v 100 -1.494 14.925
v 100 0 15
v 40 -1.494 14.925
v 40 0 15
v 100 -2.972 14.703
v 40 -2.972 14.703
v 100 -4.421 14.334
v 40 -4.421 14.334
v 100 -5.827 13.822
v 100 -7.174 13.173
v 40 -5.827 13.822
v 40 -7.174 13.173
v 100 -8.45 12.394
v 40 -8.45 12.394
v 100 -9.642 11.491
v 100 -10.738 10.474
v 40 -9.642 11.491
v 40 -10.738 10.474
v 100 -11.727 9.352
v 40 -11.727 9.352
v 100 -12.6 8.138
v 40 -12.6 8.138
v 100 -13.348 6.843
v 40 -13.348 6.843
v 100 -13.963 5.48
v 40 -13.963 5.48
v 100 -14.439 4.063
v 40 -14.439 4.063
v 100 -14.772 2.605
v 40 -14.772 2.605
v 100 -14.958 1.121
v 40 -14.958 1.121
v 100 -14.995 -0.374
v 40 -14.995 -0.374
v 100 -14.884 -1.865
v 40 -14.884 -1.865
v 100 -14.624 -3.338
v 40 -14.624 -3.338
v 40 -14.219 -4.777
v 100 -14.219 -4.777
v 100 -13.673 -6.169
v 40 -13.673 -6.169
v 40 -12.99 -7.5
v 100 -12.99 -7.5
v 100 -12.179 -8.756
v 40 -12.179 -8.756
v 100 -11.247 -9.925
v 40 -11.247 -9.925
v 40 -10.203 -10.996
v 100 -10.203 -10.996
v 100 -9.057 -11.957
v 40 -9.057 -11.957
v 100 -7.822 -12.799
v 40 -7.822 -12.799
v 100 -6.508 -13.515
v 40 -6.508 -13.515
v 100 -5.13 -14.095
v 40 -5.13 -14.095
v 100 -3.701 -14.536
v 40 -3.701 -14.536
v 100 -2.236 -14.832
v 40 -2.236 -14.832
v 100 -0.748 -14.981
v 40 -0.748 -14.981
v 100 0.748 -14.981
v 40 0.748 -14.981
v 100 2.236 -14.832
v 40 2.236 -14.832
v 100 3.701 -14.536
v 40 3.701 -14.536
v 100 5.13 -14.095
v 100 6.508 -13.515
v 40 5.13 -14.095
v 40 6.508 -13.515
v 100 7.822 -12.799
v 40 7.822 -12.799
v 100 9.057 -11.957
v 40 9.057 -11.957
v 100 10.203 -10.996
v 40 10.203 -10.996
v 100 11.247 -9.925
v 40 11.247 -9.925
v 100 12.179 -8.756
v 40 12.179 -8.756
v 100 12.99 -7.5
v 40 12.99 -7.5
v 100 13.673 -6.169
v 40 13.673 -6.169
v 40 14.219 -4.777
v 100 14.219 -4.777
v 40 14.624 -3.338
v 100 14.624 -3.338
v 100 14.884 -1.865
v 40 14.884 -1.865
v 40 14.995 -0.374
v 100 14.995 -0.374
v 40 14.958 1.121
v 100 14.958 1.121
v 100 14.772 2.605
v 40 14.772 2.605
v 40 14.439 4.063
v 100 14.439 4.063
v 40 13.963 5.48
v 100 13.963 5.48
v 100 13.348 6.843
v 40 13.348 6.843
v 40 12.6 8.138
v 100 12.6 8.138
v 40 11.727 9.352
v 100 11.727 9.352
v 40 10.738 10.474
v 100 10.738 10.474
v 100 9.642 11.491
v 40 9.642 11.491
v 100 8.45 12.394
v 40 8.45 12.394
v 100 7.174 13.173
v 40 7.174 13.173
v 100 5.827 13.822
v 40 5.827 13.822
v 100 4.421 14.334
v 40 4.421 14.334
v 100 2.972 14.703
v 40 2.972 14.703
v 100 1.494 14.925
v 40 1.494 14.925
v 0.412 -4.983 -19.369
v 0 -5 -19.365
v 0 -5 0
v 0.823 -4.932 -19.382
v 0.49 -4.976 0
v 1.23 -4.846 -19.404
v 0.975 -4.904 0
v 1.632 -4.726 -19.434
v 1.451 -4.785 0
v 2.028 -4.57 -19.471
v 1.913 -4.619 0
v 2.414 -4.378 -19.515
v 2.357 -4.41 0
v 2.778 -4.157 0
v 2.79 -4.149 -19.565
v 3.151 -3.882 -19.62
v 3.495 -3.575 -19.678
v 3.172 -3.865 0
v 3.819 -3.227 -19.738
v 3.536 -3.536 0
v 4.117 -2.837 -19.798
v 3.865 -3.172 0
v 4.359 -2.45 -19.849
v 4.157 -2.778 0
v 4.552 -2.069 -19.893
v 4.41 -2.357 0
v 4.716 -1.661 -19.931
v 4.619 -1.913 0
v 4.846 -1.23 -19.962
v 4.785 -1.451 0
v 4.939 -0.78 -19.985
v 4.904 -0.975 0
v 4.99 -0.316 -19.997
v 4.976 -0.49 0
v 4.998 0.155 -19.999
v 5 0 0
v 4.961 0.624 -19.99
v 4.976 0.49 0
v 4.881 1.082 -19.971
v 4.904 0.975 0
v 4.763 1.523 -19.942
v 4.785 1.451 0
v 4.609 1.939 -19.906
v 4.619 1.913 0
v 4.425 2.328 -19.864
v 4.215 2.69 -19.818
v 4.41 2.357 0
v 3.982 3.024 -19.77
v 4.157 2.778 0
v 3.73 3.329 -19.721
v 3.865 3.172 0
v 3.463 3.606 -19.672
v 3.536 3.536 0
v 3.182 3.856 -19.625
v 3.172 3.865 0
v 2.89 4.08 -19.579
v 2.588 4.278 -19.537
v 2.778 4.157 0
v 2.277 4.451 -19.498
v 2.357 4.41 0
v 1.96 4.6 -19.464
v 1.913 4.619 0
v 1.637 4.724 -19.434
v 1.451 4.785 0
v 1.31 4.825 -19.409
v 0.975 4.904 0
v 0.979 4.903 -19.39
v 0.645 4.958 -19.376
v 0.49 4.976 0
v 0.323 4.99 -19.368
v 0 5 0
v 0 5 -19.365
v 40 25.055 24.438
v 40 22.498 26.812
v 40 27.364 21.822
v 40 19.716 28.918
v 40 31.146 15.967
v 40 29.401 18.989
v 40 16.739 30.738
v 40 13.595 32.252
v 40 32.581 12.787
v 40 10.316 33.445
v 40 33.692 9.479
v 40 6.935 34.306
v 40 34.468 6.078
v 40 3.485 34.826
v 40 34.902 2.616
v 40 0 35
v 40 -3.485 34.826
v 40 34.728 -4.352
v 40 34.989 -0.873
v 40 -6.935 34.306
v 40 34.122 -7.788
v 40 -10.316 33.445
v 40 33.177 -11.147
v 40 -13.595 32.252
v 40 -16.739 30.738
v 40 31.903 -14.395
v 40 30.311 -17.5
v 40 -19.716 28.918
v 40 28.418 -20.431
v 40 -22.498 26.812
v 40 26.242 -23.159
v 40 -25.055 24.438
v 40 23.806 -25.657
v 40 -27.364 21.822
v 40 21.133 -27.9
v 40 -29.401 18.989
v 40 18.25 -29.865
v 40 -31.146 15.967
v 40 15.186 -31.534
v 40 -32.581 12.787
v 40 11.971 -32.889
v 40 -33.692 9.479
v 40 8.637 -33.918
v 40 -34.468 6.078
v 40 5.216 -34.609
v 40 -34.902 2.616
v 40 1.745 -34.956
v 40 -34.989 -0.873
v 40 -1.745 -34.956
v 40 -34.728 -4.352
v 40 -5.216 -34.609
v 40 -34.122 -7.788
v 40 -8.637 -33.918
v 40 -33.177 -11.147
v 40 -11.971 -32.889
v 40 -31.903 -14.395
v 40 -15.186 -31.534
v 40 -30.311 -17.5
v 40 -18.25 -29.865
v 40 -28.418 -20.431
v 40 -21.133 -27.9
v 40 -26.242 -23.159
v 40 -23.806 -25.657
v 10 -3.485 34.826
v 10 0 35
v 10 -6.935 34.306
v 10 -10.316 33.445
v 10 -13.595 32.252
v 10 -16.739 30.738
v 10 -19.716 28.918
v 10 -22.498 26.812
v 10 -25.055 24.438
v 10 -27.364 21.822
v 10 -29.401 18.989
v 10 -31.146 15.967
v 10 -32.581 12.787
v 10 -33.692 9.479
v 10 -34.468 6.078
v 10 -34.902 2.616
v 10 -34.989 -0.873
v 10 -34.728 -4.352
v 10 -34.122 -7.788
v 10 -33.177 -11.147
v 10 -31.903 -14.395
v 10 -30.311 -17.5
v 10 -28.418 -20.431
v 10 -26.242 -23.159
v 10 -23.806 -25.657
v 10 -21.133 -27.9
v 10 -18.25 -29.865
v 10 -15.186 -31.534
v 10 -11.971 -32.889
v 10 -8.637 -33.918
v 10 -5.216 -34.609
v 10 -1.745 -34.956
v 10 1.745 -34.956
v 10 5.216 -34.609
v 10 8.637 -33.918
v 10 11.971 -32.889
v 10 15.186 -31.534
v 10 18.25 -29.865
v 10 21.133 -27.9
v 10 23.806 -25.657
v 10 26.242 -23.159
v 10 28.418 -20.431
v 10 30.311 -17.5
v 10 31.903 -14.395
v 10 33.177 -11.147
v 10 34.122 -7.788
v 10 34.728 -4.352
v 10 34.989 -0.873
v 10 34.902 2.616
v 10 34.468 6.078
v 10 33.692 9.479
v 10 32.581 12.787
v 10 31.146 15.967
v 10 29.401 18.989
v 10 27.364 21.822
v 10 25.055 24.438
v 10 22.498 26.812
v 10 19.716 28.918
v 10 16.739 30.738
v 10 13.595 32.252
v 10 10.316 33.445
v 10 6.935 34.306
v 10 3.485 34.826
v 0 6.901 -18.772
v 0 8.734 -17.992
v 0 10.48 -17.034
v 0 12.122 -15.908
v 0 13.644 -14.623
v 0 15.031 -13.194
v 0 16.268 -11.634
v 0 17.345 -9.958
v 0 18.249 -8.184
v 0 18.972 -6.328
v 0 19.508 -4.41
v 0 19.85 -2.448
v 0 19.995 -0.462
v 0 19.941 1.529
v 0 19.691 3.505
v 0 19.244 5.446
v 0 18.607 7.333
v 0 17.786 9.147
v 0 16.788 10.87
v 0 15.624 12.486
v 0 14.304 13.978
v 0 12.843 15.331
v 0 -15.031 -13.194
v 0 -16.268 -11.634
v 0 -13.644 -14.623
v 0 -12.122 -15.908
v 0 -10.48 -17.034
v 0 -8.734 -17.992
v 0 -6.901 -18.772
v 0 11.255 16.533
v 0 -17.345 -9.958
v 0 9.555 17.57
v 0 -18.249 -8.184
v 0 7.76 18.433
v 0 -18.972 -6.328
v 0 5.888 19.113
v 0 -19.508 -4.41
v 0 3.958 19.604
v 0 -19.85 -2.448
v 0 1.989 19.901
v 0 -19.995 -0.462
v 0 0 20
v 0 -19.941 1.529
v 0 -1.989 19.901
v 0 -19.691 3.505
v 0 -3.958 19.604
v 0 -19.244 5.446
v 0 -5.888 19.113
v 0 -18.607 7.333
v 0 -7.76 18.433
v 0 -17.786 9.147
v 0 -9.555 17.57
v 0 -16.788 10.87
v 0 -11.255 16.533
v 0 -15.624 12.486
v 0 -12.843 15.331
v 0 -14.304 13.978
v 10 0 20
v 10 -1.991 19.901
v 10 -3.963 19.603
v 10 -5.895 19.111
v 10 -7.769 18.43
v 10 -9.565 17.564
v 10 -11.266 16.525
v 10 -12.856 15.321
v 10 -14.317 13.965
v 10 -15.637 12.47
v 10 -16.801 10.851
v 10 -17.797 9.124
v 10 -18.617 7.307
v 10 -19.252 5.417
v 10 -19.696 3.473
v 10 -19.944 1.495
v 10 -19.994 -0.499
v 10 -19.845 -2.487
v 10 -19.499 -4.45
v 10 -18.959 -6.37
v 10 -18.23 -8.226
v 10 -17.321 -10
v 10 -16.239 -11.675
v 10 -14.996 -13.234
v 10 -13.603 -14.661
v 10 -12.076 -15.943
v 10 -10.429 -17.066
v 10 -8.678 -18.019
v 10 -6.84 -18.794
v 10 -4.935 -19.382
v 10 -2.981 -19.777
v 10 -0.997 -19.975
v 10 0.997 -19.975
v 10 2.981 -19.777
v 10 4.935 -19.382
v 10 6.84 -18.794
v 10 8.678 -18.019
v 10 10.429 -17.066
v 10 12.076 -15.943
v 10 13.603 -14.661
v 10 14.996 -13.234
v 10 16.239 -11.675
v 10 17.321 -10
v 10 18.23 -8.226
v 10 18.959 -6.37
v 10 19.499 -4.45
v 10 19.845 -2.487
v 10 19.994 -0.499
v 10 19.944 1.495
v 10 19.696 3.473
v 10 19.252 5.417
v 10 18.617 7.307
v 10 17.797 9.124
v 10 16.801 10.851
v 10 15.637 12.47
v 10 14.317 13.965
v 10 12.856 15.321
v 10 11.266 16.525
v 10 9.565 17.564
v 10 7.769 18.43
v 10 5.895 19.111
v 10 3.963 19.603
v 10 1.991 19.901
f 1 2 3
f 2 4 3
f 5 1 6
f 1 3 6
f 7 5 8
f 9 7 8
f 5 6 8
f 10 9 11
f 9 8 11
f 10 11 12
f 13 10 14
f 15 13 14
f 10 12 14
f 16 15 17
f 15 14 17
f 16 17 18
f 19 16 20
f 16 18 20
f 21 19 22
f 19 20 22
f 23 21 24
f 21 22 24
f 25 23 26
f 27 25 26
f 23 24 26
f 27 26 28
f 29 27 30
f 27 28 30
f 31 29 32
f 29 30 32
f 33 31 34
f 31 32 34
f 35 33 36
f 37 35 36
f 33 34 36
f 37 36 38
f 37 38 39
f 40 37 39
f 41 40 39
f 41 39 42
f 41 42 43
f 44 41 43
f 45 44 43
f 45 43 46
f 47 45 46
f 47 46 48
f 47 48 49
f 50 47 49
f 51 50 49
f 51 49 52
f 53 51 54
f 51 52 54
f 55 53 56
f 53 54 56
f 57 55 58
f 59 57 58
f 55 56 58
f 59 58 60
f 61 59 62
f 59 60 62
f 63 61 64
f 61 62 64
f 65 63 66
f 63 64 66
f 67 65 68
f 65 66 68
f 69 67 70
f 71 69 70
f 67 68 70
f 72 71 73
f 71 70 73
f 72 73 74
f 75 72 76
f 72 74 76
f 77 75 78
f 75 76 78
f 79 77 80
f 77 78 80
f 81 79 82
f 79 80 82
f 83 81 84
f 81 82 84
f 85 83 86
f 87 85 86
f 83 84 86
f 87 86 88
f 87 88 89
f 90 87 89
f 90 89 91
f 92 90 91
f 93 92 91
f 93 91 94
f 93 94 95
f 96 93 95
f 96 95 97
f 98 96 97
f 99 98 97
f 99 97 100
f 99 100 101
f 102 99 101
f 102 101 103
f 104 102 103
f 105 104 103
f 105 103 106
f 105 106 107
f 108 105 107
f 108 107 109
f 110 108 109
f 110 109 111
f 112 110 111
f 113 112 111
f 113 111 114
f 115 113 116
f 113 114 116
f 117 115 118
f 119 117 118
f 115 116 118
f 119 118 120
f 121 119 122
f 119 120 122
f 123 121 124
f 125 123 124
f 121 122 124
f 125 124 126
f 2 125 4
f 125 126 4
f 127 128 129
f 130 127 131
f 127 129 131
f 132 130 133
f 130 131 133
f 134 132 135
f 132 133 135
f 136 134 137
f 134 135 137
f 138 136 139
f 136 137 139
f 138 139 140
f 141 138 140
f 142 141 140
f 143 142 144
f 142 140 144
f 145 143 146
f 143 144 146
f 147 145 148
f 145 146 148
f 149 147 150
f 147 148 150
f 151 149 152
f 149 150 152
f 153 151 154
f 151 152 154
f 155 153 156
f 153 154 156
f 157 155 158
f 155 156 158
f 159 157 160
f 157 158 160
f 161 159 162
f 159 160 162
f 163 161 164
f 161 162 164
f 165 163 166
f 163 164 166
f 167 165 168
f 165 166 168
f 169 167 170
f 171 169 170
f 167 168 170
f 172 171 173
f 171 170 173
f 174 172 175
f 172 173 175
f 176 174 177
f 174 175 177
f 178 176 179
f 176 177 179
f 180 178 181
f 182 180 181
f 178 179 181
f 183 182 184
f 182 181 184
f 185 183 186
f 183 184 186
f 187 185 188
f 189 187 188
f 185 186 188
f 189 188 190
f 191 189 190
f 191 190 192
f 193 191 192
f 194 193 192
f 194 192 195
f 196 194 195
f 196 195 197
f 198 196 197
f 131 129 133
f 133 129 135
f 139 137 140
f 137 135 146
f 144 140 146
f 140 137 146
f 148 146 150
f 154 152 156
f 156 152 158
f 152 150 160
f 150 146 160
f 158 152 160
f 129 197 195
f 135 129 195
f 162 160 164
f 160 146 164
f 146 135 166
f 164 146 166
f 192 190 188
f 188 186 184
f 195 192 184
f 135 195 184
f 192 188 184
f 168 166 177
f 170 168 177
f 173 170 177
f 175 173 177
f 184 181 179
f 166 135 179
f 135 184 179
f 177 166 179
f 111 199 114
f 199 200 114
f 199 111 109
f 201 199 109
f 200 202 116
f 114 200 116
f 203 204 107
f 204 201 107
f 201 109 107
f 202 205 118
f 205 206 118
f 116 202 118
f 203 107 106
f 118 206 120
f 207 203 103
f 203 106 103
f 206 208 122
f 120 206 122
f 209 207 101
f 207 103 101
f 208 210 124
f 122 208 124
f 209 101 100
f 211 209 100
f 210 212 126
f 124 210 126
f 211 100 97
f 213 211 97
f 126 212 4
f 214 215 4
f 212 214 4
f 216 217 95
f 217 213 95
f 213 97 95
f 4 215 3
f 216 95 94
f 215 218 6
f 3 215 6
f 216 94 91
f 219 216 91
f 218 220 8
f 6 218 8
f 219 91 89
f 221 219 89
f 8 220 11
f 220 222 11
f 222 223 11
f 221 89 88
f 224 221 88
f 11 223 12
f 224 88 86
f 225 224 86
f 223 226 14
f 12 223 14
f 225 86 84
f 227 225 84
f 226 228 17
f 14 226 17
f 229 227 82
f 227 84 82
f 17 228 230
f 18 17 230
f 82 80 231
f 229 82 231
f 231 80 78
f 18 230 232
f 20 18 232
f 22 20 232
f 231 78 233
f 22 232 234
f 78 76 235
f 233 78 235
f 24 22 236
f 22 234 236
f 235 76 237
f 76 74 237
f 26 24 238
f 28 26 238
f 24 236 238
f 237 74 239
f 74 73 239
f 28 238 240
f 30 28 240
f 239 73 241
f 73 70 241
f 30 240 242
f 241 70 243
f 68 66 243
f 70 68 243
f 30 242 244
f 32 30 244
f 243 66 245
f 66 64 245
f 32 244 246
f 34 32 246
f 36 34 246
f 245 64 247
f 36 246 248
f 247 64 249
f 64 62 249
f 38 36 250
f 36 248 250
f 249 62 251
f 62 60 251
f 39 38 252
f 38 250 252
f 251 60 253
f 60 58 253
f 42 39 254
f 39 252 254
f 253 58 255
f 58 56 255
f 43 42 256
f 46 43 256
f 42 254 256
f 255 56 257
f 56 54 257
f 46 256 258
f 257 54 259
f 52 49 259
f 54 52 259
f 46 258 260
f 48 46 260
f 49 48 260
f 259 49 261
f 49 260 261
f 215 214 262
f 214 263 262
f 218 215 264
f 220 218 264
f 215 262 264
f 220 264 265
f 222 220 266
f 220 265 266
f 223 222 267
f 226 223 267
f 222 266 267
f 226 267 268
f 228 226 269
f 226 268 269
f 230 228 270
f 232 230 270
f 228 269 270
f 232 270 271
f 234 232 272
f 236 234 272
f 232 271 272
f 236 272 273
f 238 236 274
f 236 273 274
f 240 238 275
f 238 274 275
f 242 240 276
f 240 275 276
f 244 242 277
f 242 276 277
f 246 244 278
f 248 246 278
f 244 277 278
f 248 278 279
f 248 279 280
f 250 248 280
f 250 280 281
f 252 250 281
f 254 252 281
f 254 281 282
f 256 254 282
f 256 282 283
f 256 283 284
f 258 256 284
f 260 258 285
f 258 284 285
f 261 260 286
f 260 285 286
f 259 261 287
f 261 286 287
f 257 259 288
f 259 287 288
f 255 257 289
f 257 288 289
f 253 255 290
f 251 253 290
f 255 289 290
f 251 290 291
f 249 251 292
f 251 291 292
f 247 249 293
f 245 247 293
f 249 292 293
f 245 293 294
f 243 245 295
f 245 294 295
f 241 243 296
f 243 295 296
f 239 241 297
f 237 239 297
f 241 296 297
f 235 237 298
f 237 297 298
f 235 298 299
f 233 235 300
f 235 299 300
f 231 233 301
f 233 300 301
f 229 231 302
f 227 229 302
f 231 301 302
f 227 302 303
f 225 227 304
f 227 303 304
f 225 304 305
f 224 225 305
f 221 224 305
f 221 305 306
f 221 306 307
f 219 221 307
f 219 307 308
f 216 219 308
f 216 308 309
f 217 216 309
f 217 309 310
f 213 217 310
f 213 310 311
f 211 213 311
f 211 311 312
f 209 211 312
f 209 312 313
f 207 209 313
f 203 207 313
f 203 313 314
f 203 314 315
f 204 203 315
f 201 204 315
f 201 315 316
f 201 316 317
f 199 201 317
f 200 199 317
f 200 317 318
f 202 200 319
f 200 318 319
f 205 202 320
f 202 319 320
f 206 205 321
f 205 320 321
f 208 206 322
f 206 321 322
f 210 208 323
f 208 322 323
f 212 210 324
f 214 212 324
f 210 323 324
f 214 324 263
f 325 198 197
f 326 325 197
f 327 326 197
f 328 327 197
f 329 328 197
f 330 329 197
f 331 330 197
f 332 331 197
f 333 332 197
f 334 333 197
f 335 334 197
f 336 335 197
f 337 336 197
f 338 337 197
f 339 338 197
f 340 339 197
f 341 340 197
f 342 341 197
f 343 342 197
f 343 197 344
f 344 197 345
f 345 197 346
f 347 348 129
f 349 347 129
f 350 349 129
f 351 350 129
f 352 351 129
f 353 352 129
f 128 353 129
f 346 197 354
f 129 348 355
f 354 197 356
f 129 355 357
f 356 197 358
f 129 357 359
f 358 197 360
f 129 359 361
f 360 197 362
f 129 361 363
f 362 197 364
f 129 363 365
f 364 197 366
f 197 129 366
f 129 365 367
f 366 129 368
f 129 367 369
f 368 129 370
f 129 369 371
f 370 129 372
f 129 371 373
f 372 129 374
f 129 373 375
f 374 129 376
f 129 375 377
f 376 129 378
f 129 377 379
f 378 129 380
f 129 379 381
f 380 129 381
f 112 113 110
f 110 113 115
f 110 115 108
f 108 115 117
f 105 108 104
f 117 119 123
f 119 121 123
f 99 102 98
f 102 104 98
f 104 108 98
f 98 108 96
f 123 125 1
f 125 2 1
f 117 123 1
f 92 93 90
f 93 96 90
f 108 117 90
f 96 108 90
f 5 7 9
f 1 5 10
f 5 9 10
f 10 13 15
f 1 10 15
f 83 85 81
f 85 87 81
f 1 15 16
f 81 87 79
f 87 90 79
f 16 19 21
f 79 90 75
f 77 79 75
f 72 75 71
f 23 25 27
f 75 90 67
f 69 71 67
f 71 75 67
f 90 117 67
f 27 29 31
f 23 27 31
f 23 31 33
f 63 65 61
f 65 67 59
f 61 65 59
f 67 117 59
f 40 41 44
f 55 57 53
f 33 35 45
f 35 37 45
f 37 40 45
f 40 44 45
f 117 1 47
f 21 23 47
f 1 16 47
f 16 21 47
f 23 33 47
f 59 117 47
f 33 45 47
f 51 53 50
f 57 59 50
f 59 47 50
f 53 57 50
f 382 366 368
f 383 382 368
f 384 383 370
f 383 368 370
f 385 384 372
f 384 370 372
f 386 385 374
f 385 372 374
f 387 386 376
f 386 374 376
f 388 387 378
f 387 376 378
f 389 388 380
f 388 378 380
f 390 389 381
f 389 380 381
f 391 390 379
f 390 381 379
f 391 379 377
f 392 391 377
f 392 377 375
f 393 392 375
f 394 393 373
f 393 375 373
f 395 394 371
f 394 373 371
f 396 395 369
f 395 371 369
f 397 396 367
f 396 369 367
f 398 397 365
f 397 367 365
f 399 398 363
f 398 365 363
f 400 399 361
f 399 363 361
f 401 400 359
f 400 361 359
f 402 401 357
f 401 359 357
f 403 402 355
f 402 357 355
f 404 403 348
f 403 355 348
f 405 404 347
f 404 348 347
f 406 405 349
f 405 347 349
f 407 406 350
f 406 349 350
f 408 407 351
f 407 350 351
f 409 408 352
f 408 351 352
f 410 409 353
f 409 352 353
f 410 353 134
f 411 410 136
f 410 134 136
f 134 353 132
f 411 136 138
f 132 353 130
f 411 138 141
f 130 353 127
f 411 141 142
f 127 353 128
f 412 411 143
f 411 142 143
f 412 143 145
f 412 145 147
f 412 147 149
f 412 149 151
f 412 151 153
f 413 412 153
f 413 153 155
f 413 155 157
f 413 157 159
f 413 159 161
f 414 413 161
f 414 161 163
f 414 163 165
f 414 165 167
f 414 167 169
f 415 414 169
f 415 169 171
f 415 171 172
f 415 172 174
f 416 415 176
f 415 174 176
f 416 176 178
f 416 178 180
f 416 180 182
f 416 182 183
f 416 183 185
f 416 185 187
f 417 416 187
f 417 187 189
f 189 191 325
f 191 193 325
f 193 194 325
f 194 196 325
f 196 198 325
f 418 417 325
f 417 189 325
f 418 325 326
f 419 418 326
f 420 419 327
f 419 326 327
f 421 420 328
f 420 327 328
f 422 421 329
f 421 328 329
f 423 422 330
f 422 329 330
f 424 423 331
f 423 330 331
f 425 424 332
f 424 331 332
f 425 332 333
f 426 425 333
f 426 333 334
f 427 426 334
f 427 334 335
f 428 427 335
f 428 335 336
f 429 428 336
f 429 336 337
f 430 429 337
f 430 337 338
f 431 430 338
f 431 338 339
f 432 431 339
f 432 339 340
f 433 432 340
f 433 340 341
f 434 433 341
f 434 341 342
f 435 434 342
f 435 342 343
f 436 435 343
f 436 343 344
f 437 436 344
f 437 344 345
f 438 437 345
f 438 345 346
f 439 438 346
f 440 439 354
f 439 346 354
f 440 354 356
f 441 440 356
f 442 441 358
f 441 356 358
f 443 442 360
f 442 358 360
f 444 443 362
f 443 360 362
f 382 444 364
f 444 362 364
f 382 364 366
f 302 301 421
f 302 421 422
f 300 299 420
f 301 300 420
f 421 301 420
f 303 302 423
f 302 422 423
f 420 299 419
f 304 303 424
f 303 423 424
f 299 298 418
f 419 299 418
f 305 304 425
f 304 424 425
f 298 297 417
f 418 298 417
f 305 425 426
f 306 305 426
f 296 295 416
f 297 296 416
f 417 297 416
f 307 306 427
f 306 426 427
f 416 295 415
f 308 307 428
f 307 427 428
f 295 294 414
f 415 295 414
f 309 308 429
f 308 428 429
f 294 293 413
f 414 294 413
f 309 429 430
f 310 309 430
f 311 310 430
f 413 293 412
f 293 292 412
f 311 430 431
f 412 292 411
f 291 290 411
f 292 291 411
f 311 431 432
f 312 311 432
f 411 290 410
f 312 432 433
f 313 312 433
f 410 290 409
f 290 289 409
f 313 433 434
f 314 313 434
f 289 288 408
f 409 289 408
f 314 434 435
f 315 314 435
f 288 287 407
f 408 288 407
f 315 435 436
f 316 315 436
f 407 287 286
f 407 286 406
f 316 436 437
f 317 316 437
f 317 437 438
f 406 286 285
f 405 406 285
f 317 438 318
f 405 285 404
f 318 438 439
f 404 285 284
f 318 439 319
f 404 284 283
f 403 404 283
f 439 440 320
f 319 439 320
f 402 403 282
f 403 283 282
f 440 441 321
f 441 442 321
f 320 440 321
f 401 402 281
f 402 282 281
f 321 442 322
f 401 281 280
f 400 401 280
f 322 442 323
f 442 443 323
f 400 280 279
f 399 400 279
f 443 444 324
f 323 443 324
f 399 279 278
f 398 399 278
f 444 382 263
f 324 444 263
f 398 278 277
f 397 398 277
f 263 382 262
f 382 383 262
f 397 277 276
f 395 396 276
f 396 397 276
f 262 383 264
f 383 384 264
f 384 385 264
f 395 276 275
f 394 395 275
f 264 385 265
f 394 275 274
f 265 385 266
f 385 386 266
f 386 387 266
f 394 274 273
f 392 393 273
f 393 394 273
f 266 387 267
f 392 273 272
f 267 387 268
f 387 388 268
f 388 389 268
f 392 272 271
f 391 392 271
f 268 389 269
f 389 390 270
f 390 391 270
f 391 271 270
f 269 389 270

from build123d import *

# Parameters (mm, degrees)
SKETCH_2_R          = 5
CUT_EXTRUDE_1_DEPTH = 20


with BuildPart() as part:
    # Эскиз1 → Повернуть1 (revolve)
    with BuildSketch(Plane.XY, mode=Mode.PRIVATE) as revolve_1_sk:
        Polygon((0, 0), (100, 0), (100, 15), (40, 15), (40, 35), (10, 35), (10, 20), (0, 20), align=None)
    revolve(revolve_1_sk.sketch.rotate(Axis((0, 0, 0), (1, 0, 0)), 90), axis=Axis((0, 0, 0), (1, 0, 0)))

    # Эскиз2 → Вырез-Вытянуть1 (cut)
    with BuildSketch(Plane.XY):
        Circle(SKETCH_2_R)
    extrude(amount=-CUT_EXTRUDE_1_DEPTH, mode=Mode.SUBTRACT)


solid = part.part
